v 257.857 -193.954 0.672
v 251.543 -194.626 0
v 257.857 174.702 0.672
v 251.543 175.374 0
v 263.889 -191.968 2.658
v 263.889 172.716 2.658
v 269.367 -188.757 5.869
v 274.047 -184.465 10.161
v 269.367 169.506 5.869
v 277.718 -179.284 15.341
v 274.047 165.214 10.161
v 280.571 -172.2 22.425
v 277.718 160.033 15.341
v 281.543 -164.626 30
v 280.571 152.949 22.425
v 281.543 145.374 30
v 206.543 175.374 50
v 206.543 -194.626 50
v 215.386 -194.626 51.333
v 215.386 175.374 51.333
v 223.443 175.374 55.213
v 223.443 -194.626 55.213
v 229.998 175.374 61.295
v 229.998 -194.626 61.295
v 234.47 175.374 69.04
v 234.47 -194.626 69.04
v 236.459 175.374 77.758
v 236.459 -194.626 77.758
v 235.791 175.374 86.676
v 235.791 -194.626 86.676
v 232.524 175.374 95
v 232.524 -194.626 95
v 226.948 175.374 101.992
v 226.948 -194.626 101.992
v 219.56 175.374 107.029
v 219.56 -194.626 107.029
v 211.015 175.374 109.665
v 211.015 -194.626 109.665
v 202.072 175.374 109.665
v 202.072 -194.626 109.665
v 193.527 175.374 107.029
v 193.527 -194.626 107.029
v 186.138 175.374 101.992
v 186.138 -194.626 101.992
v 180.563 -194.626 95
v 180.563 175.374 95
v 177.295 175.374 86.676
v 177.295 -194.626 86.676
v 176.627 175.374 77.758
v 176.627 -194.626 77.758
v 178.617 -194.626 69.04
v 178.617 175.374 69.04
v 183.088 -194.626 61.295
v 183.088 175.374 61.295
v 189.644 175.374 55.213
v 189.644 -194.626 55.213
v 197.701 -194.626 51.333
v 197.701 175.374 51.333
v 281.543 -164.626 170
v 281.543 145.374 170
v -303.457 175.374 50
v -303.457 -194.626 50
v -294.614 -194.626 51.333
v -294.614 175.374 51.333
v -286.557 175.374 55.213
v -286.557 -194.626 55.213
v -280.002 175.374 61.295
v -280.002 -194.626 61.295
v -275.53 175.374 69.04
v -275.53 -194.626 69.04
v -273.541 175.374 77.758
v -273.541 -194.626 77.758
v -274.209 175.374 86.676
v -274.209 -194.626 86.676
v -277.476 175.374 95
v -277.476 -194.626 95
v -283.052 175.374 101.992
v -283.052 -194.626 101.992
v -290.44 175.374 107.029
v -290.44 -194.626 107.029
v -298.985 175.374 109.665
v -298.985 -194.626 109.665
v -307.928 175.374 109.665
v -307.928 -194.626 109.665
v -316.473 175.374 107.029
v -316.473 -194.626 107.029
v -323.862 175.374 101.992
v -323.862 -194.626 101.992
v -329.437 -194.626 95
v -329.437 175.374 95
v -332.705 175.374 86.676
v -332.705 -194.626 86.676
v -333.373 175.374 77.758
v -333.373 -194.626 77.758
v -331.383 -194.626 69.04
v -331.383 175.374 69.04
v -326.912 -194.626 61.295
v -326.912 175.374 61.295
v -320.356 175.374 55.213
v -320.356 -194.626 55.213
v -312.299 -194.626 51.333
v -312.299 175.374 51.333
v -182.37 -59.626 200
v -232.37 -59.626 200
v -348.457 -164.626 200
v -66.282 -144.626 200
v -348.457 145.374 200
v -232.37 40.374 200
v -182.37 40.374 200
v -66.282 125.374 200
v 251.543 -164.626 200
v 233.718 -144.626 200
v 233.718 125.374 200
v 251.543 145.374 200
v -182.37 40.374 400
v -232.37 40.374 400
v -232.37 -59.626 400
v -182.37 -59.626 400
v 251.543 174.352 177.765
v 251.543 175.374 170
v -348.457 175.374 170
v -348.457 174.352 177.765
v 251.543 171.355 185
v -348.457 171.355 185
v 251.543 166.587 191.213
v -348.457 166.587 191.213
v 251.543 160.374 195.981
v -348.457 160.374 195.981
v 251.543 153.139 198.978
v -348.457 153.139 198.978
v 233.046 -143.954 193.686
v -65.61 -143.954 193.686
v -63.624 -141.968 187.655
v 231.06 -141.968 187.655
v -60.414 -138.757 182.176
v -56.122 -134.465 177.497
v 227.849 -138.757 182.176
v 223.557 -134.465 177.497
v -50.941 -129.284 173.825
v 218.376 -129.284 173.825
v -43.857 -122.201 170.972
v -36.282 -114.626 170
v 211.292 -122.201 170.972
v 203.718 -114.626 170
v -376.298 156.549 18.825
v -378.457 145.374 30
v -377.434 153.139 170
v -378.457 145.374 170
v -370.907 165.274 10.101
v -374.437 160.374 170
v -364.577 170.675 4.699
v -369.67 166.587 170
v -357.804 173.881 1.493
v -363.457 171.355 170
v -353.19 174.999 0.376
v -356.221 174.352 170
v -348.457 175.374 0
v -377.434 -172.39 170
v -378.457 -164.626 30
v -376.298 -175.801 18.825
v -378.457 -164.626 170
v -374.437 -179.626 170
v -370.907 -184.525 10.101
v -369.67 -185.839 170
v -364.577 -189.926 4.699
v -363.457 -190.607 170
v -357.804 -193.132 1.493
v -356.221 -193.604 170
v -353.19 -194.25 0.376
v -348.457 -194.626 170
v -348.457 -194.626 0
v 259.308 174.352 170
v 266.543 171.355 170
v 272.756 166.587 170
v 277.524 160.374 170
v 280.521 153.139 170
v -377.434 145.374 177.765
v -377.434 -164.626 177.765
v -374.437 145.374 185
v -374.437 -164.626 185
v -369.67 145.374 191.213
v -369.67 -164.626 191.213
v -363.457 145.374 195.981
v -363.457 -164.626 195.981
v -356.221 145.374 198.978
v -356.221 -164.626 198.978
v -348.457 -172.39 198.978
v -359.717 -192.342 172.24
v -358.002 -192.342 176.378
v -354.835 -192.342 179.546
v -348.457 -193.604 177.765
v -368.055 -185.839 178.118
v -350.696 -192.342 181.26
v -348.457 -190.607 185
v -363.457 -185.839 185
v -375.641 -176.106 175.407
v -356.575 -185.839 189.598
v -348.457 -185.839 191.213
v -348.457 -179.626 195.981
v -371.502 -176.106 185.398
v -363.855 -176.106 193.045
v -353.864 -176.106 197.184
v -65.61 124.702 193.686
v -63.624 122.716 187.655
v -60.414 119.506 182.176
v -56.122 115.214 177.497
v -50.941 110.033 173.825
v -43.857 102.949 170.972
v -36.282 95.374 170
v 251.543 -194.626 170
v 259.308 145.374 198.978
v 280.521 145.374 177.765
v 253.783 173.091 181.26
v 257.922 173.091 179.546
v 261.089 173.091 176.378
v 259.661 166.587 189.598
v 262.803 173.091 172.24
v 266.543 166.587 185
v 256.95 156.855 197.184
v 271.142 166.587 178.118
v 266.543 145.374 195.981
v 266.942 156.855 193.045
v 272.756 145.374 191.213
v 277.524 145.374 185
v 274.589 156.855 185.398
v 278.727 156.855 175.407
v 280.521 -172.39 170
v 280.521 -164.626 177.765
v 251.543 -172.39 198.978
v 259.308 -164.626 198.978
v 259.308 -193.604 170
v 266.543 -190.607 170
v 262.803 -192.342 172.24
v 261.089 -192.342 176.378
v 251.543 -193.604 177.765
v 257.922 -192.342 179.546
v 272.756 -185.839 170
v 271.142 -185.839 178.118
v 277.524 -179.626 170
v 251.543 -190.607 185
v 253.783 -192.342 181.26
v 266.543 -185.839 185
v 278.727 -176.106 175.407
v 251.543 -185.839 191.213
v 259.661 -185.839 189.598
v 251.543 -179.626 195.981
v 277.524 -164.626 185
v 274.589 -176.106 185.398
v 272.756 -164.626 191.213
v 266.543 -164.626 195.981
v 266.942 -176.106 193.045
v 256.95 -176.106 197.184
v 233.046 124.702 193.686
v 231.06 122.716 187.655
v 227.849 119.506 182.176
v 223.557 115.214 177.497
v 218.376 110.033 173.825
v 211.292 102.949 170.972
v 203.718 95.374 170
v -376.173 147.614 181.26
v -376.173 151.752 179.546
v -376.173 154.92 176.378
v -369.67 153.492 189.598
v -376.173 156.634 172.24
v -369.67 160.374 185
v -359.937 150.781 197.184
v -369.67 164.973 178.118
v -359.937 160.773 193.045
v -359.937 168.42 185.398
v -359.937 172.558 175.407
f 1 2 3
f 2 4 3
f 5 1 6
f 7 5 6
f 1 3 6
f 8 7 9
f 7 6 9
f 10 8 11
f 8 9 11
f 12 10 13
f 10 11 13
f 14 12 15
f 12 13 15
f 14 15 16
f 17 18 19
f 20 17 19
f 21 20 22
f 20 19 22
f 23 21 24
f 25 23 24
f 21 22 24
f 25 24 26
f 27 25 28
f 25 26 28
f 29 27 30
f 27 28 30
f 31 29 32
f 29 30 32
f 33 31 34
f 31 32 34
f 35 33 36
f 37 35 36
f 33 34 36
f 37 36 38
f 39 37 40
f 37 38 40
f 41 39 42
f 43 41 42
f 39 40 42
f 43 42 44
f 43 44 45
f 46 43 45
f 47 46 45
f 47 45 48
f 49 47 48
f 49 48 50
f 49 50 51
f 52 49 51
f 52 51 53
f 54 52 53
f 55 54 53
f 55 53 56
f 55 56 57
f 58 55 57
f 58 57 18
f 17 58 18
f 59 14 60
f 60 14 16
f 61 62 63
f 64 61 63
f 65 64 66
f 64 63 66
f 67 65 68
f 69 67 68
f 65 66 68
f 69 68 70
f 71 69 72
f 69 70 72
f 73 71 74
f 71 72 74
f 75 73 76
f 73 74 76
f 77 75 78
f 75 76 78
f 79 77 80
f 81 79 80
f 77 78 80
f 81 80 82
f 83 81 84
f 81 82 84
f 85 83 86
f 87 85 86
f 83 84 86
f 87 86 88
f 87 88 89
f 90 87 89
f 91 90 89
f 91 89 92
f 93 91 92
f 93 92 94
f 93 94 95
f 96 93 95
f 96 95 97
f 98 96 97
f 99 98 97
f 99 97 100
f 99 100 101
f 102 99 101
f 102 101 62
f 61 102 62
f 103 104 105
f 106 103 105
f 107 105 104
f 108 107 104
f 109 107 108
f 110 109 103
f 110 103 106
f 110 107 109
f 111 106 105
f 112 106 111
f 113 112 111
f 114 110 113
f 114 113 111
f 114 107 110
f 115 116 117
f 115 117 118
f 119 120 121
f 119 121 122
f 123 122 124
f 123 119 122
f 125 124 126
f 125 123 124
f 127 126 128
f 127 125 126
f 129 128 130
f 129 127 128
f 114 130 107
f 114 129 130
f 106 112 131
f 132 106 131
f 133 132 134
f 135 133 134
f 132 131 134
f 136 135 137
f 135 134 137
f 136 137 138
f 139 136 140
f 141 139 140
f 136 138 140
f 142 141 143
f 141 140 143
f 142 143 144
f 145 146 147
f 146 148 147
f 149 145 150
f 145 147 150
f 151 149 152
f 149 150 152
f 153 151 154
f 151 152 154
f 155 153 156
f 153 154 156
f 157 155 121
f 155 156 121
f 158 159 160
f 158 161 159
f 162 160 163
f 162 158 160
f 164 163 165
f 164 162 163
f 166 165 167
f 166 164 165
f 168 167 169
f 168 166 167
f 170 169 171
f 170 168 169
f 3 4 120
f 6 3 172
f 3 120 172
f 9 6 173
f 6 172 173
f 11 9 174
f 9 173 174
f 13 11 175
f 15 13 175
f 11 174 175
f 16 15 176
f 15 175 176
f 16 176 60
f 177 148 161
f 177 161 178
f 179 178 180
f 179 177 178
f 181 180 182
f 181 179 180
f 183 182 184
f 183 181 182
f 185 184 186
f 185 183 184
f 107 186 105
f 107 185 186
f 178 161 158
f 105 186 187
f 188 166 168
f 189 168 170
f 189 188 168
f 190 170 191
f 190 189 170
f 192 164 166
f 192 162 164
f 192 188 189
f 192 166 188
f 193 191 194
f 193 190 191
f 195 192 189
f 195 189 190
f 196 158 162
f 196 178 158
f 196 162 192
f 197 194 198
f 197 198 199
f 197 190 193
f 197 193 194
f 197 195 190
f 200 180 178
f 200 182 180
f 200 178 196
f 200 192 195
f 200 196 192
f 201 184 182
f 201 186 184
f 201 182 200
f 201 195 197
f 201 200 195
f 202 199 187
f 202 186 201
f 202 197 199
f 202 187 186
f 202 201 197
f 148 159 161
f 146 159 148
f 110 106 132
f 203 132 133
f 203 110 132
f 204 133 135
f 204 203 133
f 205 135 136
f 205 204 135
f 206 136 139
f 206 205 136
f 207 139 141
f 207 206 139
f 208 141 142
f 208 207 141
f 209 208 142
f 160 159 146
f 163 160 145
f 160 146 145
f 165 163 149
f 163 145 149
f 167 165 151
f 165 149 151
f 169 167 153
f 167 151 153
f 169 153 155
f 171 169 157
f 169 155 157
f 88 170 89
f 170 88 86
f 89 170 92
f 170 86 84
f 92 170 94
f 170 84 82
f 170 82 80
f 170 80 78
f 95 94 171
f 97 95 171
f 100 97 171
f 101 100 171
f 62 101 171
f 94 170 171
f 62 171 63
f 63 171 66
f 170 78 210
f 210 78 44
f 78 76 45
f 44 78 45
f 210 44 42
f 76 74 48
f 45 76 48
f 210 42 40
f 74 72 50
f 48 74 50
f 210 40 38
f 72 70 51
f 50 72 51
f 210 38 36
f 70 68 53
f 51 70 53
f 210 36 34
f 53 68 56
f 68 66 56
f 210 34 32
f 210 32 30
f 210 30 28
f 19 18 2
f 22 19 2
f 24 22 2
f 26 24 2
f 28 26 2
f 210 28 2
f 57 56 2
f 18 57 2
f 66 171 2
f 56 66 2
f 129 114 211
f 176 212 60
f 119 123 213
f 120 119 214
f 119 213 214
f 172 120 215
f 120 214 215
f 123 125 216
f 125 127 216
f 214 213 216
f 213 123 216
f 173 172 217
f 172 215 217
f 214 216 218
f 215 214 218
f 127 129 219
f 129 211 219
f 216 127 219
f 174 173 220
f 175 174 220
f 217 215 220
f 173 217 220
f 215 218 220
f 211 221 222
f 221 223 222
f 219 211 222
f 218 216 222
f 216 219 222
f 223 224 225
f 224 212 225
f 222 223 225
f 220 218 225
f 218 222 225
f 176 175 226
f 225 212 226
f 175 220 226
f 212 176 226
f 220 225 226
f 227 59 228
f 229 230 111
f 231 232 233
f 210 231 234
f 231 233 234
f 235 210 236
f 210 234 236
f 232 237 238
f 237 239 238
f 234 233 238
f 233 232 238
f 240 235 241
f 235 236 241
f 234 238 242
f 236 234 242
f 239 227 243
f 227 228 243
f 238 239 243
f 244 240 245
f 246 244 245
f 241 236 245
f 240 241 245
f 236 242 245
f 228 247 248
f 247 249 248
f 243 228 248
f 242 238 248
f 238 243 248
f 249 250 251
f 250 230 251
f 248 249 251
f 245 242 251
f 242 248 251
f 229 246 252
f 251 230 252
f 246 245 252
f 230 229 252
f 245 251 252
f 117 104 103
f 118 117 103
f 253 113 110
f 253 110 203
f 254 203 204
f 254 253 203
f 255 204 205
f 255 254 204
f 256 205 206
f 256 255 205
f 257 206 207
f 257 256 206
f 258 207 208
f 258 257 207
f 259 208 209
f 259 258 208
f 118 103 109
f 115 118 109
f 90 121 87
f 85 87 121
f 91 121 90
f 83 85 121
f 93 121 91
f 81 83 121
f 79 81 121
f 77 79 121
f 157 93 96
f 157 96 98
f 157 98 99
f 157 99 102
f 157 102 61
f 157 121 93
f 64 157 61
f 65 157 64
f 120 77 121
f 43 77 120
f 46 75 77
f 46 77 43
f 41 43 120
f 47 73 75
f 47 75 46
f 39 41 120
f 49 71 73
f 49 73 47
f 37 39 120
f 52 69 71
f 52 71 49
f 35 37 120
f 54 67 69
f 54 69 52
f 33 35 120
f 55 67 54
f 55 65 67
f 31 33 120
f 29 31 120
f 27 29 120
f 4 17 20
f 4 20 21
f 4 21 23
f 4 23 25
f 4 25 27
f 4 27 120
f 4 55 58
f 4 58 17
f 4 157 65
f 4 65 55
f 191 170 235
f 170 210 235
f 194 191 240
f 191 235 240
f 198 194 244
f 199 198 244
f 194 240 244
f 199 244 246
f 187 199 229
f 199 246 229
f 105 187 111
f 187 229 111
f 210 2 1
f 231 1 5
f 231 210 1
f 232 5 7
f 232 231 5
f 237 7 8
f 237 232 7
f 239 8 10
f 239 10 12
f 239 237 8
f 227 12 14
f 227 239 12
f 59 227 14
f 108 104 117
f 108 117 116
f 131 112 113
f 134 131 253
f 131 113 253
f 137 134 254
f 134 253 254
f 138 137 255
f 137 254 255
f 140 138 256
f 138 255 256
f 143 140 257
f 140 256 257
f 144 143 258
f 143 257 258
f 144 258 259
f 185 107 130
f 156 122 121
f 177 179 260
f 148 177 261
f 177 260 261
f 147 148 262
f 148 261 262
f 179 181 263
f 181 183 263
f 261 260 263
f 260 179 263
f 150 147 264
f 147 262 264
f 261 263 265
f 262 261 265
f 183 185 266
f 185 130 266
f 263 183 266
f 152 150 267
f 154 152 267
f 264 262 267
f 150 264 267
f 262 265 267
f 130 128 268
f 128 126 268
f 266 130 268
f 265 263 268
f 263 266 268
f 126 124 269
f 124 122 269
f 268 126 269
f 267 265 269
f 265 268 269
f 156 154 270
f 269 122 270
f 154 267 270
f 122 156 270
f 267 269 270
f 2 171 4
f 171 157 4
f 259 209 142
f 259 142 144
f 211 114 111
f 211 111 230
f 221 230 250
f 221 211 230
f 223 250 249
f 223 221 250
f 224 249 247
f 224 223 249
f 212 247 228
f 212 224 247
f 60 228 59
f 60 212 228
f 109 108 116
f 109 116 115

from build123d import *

# Parameters (mm, degrees)
SKIZZE1_W                       = 660
SKIZZE1_H                       = 370
AUFSATZ_LINEAR_AUSTRAGEN1_DEPTH = 200
SKIZZE2_R                       = 30
SCHNITT_LINEAR_AUSTRAGEN1_DEPTH = 566.799856976
VERRUNDUNG1_R                   = 30
SKIZZE3_W                       = 300
SKIZZE3_H                       = 270
SCHNITT_LINEAR_AUSTRAGEN2_DEPTH = 30
VERRUNDUNG2_R                   = 30
SKIZZE5_W                       = 50
SKIZZE5_H                       = 100
AUFSATZ_LINEAR_AUSTRAGEN2_DEPTH = 200


with BuildPart() as part:
    # Skizze1 → Aufsatz-Linear austragen1 (new body)
    with BuildSketch(Plane.XY):
        with Locations((-48.456705786, -9.625748503)):
            Rectangle(SKIZZE1_W, SKIZZE1_H)
    extrude(amount=AUFSATZ_LINEAR_AUSTRAGEN1_DEPTH)

    # Skizze2 → Schnitt-Linear austragen1 (cut, through all)
    with BuildSketch(Plane.XZ.offset(194.625748503)):
        with Locations(Location((-303.456705786, 80, 0), (0, 0, 270))):
            Circle(SKIZZE2_R)
        with Locations(Location((206.543294214, 80, 0), (0, 0, 270))):
            Circle(SKIZZE2_R)
    extrude(amount=-SCHNITT_LINEAR_AUSTRAGEN1_DEPTH, mode=Mode.SUBTRACT)

    # Verrundung1
    verrundung1_edges = [part.edges().sort_by_distance(p)[0] for p in [
        (281.543294214, -9.625748503, 200),
        (-48.456705786, 175.374251497, 200),
        (-378.456705786, -9.625748503, 200),
        (281.543294214, -9.625748503, 0),
        (-378.456705786, -9.625748503, 0),
        (-378.456705786, 175.374251497, 100),
        (281.543294214, 175.374251497, 100),
        (281.543294214, -194.625748503, 100),
        (-378.456705786, -194.625748503, 100),
        (-48.456705786, -194.625748503, 200),
    ]]
    fillet(verrundung1_edges, radius=VERRUNDUNG1_R)

    # Skizze3 → Schnitt-Linear austragen2 (cut)
    with BuildSketch(Plane.XY.offset(200)):
        with Locations((83.717618878, -9.625748503)):
            Rectangle(SKIZZE3_W, SKIZZE3_H)
    extrude(amount=-SCHNITT_LINEAR_AUSTRAGEN2_DEPTH, mode=Mode.SUBTRACT)

    # Verrundung2
    verrundung2_edges = [part.edges().sort_by_distance(p)[0] for p in [
        (233.717618878, -9.625748503, 170),
        (83.717618878, -144.625748503, 170),
        (-66.282381122, -9.625748503, 170),
        (83.717618878, 125.374251497, 170),
    ]]
    fillet(verrundung2_edges, radius=VERRUNDUNG2_R - 0.0001)  # a hair under: the kernel refuses the full size

    # Skizze5 → Aufsatz-Linear austragen2 (add)
    with BuildSketch(Plane.XY.offset(200)):
        with Locations((-207.369543454, -9.625748503)):
            Rectangle(SKIZZE5_W, SKIZZE5_H)
    extrude(amount=AUFSATZ_LINEAR_AUSTRAGEN2_DEPTH)


solid = part.part
